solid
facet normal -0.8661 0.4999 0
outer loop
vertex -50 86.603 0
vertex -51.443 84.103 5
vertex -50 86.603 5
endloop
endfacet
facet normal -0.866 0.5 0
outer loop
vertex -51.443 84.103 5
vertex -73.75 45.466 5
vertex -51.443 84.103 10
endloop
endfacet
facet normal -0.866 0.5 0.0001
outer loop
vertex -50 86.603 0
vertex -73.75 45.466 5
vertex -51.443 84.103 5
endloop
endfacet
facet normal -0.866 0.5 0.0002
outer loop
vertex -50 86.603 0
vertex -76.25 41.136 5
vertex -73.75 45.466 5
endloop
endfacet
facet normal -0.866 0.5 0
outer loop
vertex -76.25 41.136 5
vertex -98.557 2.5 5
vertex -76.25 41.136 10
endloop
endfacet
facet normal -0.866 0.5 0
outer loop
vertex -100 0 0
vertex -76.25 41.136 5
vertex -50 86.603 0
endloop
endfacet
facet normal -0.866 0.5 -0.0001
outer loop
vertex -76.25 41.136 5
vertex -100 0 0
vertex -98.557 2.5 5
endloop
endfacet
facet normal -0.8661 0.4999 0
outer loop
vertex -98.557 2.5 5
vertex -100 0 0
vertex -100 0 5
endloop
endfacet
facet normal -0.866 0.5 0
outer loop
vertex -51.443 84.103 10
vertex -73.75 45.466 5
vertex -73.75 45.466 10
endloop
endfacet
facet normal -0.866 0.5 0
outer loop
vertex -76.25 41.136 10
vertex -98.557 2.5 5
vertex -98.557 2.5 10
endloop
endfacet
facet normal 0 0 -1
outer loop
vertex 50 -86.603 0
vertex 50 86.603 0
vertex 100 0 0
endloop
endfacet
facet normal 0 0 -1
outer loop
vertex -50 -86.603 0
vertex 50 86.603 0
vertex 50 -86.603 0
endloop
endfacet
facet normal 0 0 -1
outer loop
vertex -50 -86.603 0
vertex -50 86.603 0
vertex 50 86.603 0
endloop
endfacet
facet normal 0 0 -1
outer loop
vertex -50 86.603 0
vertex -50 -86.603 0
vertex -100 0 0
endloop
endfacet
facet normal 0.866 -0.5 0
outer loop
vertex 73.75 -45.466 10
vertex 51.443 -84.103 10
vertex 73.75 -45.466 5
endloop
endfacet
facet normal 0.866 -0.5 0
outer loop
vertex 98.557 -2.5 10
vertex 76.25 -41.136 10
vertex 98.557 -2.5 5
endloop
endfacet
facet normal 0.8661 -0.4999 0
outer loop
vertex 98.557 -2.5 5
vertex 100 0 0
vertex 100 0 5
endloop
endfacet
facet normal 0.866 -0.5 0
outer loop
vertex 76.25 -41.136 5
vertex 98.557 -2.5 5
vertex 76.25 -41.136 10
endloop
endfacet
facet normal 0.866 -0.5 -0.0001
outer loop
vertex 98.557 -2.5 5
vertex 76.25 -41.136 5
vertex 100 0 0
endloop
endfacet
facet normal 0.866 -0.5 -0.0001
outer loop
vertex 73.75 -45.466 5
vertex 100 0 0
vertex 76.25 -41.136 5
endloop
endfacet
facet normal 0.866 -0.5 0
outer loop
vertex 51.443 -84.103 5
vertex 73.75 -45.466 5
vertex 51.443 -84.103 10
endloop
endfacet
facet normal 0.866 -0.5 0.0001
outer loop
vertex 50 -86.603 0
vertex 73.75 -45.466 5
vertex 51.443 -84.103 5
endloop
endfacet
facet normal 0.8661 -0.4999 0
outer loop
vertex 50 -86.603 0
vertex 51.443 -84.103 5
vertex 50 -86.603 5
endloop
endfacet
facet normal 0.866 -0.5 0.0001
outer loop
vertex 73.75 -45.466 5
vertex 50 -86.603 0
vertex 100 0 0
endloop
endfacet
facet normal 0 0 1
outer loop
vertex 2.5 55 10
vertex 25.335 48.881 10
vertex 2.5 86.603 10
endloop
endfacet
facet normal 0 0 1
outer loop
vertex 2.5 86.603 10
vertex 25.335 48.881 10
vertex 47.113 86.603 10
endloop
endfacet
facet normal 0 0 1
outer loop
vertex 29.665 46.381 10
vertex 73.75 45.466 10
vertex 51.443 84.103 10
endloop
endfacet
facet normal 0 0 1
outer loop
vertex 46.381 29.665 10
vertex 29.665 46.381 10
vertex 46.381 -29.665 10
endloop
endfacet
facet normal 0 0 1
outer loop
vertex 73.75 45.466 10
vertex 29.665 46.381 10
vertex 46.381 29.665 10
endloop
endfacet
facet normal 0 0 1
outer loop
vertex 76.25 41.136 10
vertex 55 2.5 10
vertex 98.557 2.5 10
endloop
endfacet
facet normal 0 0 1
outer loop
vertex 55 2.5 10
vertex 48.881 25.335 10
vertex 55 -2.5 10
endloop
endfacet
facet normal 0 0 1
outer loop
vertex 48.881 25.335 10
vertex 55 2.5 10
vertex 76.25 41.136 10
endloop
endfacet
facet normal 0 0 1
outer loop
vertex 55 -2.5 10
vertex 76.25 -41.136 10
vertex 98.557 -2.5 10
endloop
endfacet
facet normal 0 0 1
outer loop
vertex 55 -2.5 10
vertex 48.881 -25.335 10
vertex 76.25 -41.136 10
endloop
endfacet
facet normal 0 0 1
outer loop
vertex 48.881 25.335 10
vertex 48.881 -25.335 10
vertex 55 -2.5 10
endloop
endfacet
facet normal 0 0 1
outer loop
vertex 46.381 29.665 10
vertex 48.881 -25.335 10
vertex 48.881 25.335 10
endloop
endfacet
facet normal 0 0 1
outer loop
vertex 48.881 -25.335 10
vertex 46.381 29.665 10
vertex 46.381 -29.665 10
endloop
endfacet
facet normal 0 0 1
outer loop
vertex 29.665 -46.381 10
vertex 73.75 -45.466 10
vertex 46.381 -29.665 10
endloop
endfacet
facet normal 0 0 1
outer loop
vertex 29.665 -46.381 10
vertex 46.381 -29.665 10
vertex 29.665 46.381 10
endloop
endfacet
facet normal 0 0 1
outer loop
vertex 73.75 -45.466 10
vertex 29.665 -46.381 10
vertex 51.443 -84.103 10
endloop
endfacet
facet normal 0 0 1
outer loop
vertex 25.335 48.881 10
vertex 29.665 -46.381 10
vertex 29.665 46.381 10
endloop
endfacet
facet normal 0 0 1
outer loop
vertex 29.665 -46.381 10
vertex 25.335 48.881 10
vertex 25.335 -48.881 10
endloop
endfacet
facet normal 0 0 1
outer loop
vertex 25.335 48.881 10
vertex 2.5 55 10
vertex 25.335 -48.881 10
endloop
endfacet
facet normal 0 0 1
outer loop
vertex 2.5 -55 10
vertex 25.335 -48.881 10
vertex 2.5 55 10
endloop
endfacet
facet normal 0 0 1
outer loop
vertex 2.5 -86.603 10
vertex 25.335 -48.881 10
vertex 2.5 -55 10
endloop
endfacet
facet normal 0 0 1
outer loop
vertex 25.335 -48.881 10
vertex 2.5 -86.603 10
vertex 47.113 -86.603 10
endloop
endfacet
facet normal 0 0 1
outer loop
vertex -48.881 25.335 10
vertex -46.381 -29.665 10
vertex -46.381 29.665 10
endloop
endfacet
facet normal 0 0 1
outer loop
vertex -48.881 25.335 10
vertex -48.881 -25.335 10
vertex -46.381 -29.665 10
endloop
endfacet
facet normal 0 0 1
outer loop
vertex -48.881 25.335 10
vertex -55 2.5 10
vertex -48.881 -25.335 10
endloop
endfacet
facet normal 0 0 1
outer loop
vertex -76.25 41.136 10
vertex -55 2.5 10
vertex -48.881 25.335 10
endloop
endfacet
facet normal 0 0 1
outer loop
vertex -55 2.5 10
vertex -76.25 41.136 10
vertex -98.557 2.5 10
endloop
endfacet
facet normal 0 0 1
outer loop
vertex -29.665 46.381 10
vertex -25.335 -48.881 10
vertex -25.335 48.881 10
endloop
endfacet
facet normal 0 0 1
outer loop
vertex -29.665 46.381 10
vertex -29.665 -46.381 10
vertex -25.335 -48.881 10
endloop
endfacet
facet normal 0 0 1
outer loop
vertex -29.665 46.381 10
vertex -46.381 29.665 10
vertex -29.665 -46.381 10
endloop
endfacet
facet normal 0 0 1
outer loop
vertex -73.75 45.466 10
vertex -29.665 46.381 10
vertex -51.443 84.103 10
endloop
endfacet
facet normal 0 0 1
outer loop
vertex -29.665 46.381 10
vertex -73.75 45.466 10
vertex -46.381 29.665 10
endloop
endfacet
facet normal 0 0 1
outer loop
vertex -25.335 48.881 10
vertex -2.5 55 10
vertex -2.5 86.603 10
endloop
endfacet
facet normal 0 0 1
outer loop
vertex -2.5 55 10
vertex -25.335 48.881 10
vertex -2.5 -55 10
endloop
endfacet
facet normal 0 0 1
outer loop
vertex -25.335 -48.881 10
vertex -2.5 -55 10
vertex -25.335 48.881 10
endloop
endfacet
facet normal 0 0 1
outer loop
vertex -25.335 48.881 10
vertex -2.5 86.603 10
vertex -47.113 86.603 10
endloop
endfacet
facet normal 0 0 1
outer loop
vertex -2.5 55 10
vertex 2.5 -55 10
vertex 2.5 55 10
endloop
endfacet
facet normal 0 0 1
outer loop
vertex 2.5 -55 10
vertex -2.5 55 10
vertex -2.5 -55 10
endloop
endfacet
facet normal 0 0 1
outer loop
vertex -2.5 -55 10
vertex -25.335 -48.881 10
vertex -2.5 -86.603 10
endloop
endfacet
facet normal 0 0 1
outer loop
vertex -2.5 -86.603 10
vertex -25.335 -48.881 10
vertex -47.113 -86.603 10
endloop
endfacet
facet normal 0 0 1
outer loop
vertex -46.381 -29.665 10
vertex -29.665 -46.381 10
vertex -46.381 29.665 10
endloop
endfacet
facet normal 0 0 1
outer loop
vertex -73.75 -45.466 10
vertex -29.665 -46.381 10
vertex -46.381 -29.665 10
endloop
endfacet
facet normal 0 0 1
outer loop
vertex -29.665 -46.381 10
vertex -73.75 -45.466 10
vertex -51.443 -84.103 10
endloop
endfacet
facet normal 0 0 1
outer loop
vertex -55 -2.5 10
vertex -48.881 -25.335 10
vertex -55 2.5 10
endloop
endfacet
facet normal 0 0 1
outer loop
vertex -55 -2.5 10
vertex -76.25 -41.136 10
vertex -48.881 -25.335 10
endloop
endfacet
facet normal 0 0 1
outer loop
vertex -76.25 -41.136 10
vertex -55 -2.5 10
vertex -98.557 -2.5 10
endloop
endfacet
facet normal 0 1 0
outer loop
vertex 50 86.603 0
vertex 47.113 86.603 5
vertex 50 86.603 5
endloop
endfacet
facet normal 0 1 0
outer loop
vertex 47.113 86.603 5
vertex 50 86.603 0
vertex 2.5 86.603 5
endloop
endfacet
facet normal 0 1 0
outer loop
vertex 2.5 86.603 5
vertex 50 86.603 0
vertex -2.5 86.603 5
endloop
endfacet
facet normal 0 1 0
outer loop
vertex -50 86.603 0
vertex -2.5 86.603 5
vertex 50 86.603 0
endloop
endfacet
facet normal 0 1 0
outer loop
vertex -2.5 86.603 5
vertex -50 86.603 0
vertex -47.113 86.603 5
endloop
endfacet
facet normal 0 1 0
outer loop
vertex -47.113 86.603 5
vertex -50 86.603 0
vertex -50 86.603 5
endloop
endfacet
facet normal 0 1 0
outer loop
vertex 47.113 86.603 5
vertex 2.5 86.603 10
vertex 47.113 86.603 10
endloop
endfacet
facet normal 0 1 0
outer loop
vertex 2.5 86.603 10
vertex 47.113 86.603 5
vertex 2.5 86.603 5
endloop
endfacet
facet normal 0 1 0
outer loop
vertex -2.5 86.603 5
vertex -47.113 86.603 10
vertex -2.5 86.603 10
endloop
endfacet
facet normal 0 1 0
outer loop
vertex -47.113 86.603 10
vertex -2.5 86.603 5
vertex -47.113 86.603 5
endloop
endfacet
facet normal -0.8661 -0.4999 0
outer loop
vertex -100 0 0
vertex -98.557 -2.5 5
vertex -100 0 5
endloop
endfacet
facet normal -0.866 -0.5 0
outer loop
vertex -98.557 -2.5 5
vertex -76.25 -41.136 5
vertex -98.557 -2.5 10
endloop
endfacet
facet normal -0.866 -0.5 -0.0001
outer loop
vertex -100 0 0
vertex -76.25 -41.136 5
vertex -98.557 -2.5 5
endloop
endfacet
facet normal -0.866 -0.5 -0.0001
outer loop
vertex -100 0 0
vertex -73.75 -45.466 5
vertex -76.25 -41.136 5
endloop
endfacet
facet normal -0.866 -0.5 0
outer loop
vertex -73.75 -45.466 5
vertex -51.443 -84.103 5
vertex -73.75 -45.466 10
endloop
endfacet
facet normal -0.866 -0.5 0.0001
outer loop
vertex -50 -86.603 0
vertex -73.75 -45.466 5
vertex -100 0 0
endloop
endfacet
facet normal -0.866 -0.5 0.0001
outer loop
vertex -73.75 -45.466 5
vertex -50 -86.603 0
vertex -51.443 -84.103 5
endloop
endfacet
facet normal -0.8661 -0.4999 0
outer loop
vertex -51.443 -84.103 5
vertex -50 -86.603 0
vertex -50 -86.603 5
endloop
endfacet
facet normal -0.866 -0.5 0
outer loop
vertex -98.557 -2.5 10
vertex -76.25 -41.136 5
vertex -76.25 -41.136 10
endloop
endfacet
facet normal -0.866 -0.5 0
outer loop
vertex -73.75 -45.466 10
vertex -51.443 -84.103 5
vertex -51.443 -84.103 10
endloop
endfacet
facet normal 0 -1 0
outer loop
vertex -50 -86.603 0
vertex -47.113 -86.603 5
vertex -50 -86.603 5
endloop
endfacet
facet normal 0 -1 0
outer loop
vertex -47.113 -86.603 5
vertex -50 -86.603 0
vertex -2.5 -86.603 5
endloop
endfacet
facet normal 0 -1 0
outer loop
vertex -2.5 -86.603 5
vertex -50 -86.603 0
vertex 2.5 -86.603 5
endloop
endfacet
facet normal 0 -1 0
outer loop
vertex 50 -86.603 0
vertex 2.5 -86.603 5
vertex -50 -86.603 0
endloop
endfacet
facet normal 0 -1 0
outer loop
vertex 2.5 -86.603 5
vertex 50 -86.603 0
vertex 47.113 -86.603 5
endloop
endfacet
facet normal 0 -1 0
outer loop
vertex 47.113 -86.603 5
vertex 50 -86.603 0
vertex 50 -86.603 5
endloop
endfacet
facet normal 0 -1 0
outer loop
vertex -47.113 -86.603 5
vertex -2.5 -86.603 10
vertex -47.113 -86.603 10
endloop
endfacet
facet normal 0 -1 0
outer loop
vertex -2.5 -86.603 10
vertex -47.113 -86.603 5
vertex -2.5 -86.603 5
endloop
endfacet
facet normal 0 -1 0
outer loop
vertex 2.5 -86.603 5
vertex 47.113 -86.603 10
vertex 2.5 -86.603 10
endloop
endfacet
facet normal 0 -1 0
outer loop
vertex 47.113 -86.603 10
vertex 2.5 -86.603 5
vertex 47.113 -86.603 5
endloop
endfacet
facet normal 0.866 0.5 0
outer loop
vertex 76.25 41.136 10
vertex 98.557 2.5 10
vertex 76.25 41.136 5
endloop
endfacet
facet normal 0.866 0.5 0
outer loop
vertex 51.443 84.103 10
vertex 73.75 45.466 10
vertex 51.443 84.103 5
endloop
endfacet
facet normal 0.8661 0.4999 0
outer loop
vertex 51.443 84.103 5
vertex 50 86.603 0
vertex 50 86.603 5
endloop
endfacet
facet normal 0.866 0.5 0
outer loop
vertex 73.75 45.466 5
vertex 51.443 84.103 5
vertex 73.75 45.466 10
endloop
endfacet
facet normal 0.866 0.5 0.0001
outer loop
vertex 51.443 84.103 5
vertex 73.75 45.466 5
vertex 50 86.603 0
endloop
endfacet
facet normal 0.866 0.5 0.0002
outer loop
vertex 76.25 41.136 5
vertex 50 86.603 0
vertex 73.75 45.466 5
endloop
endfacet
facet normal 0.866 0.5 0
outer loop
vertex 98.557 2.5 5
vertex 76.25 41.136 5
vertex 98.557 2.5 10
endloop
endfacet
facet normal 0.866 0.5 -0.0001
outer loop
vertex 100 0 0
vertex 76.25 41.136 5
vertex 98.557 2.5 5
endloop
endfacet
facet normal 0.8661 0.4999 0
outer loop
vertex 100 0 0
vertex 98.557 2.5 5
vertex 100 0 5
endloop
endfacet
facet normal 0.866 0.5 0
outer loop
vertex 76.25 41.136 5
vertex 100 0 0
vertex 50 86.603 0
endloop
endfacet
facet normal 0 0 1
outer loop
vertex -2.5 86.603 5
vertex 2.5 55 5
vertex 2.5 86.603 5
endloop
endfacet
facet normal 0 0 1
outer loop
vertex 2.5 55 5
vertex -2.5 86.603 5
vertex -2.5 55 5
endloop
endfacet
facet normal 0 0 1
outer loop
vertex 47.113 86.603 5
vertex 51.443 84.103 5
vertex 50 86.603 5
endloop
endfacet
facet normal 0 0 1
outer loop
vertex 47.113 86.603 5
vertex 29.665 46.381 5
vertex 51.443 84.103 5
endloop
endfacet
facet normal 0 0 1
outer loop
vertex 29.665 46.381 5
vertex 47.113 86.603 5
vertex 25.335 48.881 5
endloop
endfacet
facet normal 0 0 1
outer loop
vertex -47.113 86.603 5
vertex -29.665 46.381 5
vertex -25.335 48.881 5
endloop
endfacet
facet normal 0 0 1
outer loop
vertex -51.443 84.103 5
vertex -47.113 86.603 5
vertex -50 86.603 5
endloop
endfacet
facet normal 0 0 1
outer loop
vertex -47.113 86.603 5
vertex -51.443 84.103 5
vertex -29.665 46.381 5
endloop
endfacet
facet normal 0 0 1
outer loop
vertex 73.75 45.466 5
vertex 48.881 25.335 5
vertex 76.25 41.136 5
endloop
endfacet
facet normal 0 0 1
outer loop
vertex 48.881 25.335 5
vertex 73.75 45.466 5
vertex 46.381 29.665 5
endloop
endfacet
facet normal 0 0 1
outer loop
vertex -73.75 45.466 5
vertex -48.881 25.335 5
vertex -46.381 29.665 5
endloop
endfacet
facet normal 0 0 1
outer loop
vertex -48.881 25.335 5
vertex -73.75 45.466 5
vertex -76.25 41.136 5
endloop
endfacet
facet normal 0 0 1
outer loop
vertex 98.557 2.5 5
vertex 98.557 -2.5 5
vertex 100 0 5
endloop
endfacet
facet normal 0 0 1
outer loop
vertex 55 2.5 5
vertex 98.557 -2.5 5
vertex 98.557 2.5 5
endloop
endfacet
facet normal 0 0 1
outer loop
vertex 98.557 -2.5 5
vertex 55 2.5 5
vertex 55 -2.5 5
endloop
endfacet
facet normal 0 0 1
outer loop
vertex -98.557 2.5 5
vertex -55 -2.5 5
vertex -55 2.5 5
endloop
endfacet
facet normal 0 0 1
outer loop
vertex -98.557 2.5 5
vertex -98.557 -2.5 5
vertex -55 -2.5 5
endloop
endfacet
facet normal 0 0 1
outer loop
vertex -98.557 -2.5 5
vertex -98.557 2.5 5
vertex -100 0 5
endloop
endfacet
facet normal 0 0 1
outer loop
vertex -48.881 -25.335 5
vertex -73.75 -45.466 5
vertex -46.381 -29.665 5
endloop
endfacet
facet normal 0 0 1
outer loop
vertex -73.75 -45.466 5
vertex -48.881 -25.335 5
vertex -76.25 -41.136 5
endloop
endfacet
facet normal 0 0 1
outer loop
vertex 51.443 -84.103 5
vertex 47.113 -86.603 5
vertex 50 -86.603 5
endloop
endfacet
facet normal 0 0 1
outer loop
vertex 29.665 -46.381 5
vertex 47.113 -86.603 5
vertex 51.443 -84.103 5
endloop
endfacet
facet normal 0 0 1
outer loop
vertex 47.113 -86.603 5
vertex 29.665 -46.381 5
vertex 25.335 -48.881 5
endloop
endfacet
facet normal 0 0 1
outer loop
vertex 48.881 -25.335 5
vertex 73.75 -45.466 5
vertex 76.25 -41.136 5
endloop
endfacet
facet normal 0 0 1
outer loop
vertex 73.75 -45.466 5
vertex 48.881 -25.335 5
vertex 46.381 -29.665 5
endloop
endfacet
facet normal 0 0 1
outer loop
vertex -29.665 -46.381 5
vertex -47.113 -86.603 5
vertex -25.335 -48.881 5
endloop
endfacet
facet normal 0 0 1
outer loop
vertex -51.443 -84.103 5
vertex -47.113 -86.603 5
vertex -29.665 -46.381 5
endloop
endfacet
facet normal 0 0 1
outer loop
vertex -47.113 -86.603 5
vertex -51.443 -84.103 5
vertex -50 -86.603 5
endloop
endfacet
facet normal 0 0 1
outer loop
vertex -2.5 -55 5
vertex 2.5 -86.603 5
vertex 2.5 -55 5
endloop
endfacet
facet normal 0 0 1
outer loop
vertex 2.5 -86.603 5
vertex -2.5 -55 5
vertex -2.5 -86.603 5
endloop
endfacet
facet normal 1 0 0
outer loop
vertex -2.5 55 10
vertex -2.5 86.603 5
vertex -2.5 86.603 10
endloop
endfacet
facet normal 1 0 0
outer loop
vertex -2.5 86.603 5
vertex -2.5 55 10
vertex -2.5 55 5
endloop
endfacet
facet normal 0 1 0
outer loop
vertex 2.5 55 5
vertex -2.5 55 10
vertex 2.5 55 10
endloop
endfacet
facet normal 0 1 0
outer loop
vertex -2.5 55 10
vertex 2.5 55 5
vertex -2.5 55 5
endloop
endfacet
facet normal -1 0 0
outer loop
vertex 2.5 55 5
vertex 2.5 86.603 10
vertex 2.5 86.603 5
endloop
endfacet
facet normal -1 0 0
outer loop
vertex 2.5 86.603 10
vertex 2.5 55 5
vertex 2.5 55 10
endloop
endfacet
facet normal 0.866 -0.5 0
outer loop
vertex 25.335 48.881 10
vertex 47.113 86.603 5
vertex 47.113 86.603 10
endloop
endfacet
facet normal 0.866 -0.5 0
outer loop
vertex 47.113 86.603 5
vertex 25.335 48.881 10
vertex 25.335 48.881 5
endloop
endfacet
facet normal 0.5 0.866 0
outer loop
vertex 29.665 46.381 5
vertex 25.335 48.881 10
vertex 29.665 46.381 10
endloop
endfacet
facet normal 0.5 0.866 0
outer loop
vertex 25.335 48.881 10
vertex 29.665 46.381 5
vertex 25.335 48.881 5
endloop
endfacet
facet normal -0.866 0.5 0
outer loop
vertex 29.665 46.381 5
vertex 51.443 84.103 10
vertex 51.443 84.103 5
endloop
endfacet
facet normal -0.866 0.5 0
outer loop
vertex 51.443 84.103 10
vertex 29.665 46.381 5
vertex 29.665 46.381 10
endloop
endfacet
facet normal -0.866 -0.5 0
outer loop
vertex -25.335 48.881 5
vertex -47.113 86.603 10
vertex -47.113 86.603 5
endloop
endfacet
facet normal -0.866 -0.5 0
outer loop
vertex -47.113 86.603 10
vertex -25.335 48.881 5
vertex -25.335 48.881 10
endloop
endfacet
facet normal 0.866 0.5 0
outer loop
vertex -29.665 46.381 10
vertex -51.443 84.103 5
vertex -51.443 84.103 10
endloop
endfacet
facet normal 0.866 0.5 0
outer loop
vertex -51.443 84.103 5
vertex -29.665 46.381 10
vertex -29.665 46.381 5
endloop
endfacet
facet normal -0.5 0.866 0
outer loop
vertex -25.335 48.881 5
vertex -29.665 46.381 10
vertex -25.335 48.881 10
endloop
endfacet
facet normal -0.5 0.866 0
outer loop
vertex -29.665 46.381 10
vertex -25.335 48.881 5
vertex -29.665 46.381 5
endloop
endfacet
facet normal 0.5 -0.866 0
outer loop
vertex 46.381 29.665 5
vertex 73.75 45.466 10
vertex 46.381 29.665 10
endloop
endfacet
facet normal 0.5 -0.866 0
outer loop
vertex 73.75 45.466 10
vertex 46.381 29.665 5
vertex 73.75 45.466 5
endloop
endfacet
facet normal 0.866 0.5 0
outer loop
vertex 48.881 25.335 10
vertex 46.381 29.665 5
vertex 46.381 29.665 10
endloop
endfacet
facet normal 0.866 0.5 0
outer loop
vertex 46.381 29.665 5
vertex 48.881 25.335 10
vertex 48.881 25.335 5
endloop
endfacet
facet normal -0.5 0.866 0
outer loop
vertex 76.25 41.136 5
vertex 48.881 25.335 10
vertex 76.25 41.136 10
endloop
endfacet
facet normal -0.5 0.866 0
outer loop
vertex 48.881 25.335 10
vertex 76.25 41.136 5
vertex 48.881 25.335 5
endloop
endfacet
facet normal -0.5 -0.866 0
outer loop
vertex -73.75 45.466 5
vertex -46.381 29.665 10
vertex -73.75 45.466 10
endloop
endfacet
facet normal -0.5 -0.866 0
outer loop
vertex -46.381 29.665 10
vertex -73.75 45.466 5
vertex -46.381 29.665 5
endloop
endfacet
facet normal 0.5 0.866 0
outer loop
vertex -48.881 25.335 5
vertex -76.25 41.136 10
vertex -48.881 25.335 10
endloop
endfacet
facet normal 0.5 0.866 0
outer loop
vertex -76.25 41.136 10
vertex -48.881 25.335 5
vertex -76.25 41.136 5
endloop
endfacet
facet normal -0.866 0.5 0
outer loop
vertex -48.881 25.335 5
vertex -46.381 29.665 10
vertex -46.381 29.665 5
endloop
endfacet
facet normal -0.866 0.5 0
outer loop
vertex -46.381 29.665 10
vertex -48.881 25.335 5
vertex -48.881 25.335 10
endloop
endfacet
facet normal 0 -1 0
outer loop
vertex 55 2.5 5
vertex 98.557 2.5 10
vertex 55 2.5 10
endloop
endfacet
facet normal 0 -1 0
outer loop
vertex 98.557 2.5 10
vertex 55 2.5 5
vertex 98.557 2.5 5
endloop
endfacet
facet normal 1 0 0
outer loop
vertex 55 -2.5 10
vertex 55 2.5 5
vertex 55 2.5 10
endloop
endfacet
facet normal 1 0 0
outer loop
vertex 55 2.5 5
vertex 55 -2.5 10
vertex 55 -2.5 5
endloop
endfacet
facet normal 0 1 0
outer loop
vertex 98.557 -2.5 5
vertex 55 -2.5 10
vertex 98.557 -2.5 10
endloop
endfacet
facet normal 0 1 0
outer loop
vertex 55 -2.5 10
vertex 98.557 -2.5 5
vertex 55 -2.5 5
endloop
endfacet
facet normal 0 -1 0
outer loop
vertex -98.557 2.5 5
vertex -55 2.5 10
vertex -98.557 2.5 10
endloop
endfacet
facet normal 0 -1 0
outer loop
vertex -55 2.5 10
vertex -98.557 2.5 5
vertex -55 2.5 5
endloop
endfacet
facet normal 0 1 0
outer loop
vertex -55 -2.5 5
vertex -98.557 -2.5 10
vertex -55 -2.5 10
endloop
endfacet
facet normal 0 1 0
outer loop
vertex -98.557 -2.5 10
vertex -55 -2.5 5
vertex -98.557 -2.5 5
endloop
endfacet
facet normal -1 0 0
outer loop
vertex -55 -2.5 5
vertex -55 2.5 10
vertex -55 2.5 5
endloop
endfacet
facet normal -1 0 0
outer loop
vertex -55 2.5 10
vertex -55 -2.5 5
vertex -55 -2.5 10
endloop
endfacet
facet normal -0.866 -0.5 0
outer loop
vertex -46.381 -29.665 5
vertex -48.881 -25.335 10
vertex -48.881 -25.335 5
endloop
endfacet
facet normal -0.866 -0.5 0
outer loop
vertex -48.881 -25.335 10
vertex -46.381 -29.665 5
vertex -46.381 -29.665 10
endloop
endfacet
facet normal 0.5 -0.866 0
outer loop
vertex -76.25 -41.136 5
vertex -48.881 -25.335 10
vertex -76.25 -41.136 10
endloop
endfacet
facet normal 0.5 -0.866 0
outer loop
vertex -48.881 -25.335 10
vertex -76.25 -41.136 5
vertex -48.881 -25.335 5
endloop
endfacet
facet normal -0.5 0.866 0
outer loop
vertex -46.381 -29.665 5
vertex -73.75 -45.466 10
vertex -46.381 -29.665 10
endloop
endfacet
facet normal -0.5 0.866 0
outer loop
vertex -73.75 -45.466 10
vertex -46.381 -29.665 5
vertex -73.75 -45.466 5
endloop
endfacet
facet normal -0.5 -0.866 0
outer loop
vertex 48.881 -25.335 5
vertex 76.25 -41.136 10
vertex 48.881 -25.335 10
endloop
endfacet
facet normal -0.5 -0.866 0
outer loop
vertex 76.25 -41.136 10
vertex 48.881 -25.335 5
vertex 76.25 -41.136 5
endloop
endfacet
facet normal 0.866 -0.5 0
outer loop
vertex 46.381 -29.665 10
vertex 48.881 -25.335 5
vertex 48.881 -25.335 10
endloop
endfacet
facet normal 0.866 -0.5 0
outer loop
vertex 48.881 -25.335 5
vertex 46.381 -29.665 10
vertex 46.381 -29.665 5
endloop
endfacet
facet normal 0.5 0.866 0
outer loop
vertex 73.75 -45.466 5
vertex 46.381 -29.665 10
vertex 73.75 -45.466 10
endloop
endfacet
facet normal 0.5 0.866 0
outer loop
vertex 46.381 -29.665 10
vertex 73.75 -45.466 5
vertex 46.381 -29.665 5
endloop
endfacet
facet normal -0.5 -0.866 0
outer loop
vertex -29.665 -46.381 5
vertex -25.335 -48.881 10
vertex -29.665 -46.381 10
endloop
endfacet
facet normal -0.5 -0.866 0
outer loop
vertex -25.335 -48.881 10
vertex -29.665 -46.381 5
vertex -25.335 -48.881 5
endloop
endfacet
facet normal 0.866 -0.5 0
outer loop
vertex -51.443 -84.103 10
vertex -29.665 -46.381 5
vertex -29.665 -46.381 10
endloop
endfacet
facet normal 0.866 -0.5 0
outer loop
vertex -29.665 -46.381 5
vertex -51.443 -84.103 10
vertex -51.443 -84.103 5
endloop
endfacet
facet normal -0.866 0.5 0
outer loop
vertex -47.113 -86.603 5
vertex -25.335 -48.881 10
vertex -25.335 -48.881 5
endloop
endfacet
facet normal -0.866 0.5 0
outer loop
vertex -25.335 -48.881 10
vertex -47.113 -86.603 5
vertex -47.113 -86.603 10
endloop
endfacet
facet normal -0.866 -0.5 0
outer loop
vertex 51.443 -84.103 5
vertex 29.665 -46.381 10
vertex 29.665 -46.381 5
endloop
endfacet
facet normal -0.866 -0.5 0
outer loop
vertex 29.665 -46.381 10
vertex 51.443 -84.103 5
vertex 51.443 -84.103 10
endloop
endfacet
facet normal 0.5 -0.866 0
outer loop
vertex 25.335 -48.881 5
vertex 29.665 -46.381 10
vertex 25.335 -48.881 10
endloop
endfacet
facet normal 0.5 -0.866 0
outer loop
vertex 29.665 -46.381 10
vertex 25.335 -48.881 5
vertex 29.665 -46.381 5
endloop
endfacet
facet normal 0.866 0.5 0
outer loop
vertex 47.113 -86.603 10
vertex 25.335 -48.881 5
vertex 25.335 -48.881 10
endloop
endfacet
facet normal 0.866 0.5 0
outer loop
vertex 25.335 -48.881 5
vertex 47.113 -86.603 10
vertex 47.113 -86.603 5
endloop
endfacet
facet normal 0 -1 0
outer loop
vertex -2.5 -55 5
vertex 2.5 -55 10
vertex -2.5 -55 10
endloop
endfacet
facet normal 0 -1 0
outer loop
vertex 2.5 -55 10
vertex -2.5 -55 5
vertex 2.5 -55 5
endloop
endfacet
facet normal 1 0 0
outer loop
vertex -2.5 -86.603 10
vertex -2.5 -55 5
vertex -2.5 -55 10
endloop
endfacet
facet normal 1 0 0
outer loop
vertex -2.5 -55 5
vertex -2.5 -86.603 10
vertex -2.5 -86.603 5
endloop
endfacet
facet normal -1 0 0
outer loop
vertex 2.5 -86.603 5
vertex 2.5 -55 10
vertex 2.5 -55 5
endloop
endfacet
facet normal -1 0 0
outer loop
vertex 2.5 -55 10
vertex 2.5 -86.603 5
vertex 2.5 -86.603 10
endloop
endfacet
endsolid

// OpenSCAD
// file: ../common/point_groups.scad
// Cyclic group C_n. It always rotates around the z axis
module cyclic(n) {
    for (i=[0:(n - 1)]) {
        angle = i * 360 / n;
        rotate([0, 0, angle])
        children();
    }
}
// main file
include <../common/point_groups.scad>

module ticks() {
  linear_extrude(10)
  cyclic(12)
  translate([80, 0])
  square([50, 5], center=true);
}

module bestagon() {
  linear_extrude(10)
  circle(r=100, $fn=6);
}

difference() {
  bestagon();
  
  translate([0, 0, 5])
  ticks();
}
